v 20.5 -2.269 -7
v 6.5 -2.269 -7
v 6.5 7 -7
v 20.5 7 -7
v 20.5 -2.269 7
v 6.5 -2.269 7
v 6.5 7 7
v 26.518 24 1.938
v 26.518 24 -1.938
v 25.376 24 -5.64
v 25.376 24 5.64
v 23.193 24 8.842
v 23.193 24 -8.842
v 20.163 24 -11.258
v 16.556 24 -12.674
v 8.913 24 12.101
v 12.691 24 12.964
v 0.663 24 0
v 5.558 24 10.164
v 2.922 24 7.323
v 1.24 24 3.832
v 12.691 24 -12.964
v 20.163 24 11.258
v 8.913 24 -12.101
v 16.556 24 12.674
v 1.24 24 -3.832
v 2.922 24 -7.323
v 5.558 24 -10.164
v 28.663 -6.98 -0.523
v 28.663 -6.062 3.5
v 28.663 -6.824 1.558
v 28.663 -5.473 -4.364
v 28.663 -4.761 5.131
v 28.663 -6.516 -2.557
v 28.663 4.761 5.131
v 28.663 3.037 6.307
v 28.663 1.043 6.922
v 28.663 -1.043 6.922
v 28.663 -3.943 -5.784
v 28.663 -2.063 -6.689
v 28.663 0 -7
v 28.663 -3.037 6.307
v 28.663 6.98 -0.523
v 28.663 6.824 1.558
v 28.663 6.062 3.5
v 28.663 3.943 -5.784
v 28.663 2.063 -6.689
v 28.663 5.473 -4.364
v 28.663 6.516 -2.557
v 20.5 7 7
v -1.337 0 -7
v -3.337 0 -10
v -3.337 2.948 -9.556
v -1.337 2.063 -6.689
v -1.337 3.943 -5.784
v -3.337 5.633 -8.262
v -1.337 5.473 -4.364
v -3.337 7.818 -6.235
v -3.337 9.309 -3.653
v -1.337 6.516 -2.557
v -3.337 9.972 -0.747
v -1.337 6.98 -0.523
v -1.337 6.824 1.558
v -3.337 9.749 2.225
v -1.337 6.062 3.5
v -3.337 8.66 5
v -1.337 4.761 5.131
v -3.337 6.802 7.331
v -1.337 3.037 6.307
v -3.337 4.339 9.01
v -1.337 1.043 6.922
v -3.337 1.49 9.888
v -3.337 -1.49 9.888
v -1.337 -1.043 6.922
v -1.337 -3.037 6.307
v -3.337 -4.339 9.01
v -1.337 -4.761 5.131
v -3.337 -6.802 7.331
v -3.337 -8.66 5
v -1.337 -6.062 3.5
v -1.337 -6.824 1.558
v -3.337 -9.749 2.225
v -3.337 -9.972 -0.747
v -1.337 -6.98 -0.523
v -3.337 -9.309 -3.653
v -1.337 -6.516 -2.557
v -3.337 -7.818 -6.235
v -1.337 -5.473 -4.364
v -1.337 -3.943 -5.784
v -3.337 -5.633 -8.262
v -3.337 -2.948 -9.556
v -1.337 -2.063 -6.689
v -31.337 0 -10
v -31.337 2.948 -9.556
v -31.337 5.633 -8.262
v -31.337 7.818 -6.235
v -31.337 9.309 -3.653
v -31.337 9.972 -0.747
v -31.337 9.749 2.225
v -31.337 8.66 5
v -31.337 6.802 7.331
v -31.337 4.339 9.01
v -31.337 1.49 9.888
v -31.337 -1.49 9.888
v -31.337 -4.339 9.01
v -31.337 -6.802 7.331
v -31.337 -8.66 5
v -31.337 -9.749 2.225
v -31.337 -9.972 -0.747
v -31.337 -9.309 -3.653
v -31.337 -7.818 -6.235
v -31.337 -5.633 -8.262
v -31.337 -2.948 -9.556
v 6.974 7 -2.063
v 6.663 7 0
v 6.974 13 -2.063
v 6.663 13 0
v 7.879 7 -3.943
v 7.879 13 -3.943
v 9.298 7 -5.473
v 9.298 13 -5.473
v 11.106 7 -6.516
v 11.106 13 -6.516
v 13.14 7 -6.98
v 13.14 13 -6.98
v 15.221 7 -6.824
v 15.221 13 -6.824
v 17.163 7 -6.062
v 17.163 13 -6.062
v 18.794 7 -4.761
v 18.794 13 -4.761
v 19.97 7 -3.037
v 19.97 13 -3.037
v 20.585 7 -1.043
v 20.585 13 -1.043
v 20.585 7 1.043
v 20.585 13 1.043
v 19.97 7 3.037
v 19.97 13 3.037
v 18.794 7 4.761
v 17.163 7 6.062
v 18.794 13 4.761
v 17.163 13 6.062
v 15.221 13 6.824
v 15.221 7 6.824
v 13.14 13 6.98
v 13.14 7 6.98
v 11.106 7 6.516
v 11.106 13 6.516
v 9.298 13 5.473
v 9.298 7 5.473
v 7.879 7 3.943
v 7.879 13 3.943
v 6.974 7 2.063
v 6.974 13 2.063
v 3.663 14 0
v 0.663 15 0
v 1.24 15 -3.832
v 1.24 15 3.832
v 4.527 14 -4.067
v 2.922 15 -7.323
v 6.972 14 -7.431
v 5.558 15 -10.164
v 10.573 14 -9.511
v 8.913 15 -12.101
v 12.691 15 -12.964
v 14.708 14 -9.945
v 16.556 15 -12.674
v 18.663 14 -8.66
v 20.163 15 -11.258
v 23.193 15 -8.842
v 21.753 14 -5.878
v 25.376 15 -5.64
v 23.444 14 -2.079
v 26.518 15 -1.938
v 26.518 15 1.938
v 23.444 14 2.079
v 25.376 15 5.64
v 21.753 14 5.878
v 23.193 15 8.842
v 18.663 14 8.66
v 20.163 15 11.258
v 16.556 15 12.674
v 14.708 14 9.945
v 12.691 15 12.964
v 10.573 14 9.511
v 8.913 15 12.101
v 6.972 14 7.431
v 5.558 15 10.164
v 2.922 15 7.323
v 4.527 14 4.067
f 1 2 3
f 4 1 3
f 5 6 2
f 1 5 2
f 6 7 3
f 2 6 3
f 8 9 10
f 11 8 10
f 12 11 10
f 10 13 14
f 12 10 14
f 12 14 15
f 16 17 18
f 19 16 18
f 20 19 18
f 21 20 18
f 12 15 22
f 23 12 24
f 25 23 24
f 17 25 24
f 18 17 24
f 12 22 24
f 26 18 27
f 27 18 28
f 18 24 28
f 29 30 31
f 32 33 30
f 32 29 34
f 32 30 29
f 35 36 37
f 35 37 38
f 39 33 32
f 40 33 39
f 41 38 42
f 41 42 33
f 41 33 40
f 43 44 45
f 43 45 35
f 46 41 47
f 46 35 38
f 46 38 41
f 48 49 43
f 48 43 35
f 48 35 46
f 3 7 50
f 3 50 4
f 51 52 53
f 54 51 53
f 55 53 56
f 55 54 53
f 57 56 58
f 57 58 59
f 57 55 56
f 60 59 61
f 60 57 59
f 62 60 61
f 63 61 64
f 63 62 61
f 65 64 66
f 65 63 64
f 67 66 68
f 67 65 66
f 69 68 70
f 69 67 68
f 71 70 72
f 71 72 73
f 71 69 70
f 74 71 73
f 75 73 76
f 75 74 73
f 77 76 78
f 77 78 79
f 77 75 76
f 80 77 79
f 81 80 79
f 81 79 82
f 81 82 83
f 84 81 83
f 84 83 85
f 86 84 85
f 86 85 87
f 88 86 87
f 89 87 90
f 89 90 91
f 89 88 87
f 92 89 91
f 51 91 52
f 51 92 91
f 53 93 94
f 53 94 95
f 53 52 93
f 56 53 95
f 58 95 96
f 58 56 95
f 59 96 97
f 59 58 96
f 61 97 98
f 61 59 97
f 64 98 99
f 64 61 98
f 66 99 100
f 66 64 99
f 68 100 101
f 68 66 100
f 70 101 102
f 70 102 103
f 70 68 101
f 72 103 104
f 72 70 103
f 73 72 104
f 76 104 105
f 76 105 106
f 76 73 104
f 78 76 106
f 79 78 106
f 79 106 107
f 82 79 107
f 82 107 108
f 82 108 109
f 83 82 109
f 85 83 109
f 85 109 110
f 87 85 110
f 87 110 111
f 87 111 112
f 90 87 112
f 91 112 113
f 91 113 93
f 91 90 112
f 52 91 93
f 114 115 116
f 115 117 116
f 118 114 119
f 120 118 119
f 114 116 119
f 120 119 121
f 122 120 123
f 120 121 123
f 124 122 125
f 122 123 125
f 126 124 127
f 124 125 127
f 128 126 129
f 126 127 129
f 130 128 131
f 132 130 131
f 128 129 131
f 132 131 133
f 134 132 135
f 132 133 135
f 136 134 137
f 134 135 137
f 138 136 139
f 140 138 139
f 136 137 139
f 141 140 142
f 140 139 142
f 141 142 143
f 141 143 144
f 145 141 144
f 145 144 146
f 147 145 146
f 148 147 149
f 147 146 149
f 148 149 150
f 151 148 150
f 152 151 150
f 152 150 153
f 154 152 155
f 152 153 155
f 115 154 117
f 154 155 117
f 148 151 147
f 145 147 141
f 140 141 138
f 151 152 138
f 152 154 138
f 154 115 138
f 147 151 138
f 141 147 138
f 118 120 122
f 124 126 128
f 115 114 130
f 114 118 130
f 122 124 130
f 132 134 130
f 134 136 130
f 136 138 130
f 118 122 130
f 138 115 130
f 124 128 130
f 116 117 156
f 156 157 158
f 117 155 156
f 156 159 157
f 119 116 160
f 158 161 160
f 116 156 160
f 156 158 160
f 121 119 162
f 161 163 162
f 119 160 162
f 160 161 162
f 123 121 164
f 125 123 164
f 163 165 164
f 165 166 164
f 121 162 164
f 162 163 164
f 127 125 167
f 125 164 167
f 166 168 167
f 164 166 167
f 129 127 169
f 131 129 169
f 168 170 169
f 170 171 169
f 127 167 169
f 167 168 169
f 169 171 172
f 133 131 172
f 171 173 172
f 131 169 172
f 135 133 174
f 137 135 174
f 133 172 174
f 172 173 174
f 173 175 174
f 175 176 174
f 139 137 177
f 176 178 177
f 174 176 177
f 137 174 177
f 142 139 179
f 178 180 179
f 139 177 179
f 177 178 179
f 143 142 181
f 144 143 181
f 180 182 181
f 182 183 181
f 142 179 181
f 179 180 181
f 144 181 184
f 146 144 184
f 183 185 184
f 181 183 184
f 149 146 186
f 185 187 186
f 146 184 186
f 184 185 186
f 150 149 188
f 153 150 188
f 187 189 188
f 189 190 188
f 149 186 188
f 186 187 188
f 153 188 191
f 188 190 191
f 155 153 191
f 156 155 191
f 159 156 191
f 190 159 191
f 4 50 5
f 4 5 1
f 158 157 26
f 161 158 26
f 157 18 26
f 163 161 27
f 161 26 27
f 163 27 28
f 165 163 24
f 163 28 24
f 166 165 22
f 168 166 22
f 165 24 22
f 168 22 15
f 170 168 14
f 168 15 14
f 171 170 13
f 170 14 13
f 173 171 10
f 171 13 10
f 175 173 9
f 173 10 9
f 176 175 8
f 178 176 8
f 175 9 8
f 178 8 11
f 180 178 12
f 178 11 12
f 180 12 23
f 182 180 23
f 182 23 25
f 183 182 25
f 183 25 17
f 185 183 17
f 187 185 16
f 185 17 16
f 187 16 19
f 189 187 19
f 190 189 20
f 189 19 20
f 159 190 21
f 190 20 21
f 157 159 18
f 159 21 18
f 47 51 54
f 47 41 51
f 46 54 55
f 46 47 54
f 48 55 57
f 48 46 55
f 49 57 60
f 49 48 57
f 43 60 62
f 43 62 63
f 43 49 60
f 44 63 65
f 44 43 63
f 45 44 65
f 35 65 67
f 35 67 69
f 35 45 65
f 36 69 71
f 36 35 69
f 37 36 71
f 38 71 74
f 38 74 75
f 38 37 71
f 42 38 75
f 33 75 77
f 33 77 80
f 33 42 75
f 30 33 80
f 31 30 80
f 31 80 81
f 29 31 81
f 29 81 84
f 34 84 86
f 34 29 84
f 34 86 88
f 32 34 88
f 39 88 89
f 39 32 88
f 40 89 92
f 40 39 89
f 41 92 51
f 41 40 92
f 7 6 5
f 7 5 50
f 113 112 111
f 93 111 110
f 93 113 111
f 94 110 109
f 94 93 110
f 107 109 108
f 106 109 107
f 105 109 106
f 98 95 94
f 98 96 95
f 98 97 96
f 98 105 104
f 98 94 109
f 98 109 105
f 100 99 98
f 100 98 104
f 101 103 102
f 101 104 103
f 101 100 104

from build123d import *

# Parameters (mm, degrees)
BOSS_EXTRUDE2_START = 13.5
SKETCH5_W           = 14
SKETCH5_H           = 9.269178055
BOSS_EXTRUDE2_DEPTH = 7


with BuildPart() as part:
    # Sketch1 → Revolve1 (revolve)
    with BuildSketch(Plane(origin=(0, 0, 0), x_dir=(1, 0, 0), z_dir=(0, 1, 0))):
        Polygon((-31.337087529, 10), (-3.337087529, 10), (-1.337087529, 7), (28.662912471, 7), (28.662912471, 0), (-31.337087529, 0), align=None)
    revolve(axis=Axis((-36.380417391, 0, 0), (1, 0, 0)))


with BuildPart() as body_2:
    # Sketch4 → Revolve2 (revolve)
    with BuildSketch(Plane.XY):
        Polygon((6.662912471, 7), (6.662912471, 13), (0.662912471, 15), (0.662912471, 24), (13.662912471, 24), (13.662912471, 7), align=None)
    revolve(axis=Axis((13.662912471, 24, 0), (0, -1, 0)))


with BuildPart() as body_3:
    # Sketch5 → Boss-Extrude2 (new body, symmetric)
    with BuildSketch(Plane(origin=(0, 0, 0), x_dir=(0, 0, -1), z_dir=(1, 0, 0)).offset(BOSS_EXTRUDE2_START)):
        with Locations((0, 2.365410972)):
            Rectangle(SKETCH5_W, SKETCH5_H)
    extrude(amount=BOSS_EXTRUDE2_DEPTH, both=True)


solid = Compound([part.part, body_2.part, body_3.part])
